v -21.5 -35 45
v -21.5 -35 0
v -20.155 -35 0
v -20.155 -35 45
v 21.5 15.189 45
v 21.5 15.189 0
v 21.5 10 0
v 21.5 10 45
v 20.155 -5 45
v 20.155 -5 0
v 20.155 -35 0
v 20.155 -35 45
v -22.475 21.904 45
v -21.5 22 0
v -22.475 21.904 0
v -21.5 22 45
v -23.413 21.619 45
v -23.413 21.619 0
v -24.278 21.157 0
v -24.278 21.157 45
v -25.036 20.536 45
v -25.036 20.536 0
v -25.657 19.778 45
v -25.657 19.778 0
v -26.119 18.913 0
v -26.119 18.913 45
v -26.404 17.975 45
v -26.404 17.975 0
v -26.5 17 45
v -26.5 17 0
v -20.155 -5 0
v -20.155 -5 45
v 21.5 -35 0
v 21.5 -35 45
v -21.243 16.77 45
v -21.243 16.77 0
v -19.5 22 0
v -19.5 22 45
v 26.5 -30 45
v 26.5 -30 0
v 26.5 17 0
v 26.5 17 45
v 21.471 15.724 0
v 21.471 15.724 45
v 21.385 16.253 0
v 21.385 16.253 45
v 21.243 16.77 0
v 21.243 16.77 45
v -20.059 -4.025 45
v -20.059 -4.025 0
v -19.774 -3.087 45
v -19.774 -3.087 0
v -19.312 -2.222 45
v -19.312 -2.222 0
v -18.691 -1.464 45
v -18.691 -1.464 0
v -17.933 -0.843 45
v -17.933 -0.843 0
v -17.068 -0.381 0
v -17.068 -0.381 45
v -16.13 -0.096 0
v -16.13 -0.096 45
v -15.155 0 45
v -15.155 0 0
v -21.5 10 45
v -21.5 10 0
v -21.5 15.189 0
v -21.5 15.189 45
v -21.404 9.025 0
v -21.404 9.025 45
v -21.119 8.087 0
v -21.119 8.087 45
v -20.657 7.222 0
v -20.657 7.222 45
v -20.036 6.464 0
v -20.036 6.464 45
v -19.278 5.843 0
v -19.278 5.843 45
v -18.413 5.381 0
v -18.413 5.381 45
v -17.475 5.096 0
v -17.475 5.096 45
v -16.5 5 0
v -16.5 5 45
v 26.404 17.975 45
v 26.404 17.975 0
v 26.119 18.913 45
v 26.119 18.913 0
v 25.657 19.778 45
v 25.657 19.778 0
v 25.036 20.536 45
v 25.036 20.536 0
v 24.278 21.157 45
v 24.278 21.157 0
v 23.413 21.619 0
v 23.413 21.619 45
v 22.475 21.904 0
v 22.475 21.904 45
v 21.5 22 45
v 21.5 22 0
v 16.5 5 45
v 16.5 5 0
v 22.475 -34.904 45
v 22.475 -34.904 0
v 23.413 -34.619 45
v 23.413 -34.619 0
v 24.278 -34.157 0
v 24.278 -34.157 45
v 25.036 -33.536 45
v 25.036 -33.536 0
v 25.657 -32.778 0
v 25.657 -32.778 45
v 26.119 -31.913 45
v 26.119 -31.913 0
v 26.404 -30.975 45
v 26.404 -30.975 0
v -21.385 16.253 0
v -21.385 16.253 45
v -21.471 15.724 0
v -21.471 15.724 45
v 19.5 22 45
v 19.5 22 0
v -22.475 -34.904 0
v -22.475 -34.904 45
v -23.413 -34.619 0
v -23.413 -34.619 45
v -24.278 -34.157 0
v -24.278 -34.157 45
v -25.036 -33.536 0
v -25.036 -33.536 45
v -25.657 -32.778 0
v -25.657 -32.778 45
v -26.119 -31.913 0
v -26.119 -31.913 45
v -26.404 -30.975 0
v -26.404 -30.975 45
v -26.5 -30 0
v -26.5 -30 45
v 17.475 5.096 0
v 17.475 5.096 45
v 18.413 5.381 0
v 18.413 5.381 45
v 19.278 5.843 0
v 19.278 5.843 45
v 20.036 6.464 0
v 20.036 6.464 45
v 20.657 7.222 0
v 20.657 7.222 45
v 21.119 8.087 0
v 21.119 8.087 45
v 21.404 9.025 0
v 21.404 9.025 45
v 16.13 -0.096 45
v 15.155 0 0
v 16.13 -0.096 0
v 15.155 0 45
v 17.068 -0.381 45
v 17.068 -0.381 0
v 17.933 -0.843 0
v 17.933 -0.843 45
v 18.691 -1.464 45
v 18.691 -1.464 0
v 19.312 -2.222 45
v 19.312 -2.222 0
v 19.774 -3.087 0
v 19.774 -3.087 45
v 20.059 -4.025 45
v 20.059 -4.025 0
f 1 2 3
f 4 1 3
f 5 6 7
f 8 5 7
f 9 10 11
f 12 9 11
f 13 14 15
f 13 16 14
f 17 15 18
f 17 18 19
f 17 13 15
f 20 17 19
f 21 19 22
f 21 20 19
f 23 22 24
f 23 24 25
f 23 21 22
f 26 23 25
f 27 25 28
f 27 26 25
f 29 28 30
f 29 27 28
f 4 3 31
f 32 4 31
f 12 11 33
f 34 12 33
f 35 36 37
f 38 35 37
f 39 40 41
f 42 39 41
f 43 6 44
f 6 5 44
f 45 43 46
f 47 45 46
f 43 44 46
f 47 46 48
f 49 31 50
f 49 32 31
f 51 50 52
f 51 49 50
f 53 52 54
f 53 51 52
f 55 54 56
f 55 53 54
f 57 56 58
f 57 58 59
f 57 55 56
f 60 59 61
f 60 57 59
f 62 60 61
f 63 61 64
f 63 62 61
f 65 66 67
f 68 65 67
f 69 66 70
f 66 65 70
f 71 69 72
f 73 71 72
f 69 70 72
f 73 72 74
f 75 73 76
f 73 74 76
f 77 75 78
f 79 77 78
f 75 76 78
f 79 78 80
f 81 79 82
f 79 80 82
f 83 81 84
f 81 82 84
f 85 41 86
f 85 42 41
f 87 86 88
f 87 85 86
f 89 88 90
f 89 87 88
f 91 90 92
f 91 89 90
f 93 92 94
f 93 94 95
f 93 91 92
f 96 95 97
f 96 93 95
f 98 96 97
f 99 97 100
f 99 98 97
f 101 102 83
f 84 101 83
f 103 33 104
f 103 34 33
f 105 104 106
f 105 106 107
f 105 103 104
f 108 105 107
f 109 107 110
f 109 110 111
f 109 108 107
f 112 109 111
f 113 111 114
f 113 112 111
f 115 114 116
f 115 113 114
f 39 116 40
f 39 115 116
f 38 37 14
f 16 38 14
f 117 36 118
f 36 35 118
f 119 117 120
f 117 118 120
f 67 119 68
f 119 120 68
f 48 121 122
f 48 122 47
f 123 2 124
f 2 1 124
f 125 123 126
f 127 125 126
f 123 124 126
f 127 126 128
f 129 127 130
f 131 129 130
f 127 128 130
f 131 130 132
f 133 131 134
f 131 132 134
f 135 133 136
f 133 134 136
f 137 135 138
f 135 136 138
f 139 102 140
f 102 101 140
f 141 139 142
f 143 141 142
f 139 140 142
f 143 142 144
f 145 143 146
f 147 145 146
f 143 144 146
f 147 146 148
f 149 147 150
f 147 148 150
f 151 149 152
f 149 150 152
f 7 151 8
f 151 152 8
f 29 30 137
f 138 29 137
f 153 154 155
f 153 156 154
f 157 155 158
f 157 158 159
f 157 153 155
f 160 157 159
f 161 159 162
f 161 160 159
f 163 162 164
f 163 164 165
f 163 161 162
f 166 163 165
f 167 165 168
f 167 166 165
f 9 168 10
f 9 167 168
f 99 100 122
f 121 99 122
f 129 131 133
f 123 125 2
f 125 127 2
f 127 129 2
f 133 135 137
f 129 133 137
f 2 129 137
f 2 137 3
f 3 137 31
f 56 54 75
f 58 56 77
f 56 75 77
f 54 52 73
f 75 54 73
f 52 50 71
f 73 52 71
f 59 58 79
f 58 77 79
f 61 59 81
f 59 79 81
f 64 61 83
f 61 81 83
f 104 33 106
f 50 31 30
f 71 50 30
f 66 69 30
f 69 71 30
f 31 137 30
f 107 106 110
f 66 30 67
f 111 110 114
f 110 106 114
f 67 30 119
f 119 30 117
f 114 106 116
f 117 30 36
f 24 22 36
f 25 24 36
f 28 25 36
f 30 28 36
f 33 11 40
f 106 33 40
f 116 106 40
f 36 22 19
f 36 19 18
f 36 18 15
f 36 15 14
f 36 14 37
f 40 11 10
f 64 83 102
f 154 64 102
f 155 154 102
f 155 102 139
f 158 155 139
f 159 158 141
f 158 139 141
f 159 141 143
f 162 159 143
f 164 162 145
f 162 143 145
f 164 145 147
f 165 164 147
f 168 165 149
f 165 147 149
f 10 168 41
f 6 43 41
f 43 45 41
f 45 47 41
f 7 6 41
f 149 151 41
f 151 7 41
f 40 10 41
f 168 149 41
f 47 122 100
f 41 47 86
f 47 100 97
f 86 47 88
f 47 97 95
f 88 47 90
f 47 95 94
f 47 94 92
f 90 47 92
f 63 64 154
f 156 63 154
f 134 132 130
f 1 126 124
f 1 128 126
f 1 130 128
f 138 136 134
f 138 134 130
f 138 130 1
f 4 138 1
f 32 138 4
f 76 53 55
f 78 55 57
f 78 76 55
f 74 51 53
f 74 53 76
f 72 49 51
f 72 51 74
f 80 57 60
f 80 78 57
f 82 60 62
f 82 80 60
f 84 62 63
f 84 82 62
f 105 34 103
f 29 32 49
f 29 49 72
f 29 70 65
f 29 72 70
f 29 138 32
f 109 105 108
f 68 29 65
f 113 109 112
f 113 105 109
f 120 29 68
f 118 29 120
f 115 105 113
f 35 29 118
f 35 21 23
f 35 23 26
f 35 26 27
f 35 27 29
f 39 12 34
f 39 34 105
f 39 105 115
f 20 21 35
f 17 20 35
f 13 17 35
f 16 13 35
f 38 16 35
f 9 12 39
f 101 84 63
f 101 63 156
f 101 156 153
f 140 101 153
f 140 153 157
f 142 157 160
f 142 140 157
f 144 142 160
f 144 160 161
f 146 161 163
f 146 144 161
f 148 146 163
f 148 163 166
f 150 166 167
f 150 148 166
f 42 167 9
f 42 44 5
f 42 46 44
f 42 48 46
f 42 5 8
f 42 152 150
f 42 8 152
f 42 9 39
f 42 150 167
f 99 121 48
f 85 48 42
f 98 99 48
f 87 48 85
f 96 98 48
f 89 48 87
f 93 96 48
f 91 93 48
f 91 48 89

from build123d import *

# Parameters (mm, degrees)
F1_DEPTH = 45
F2_R     = 5
F3_R     = 5
F4_R     = 5


with BuildPart() as f1:
    # F0 (on Top) → F1 (new body)
    with BuildSketch(Plane.XY):
        Polygon((-26.5, -35), (-20.155, -35), (-20.155, 0), (20.155, 0), (20.155, -35), (26.5, -35), (26.5, 22), (21.5, 22), (19.5, 22), (21.5, 16), (21.5, 5), (-21.5, 5), (-21.5, 16), (-19.5, 22), (-21.5, 22), (-26.5, 22), align=None)
    extrude(amount=F1_DEPTH)

    # F2
    f2_edges = [f1.edges().sort_by_distance(p)[0] for p in [
        (26.5, -35, 22.5),
        (-26.5, -35, 22.5),
        (-26.5, 22, 22.5),
        (26.5, 22, 22.5),
    ]]
    fillet(f2_edges, radius=F2_R)

    # F3
    f3_edges = [f1.edges().sort_by_distance(p)[0] for p in [
        (-21.5, 16, 22.5),
        (21.5, 16, 22.5),
        (-21.5, 5, 22.5),
        (21.5, 5, 22.5),
    ]]
    fillet(f3_edges, radius=F3_R)

    # F4
    f4_edges = [f1.edges().sort_by_distance(p)[0] for p in [
        (-20.155, 0, 22.5),
        (20.155, 0, 22.5),
    ]]
    fillet(f4_edges, radius=F4_R)


solid = f1.part
